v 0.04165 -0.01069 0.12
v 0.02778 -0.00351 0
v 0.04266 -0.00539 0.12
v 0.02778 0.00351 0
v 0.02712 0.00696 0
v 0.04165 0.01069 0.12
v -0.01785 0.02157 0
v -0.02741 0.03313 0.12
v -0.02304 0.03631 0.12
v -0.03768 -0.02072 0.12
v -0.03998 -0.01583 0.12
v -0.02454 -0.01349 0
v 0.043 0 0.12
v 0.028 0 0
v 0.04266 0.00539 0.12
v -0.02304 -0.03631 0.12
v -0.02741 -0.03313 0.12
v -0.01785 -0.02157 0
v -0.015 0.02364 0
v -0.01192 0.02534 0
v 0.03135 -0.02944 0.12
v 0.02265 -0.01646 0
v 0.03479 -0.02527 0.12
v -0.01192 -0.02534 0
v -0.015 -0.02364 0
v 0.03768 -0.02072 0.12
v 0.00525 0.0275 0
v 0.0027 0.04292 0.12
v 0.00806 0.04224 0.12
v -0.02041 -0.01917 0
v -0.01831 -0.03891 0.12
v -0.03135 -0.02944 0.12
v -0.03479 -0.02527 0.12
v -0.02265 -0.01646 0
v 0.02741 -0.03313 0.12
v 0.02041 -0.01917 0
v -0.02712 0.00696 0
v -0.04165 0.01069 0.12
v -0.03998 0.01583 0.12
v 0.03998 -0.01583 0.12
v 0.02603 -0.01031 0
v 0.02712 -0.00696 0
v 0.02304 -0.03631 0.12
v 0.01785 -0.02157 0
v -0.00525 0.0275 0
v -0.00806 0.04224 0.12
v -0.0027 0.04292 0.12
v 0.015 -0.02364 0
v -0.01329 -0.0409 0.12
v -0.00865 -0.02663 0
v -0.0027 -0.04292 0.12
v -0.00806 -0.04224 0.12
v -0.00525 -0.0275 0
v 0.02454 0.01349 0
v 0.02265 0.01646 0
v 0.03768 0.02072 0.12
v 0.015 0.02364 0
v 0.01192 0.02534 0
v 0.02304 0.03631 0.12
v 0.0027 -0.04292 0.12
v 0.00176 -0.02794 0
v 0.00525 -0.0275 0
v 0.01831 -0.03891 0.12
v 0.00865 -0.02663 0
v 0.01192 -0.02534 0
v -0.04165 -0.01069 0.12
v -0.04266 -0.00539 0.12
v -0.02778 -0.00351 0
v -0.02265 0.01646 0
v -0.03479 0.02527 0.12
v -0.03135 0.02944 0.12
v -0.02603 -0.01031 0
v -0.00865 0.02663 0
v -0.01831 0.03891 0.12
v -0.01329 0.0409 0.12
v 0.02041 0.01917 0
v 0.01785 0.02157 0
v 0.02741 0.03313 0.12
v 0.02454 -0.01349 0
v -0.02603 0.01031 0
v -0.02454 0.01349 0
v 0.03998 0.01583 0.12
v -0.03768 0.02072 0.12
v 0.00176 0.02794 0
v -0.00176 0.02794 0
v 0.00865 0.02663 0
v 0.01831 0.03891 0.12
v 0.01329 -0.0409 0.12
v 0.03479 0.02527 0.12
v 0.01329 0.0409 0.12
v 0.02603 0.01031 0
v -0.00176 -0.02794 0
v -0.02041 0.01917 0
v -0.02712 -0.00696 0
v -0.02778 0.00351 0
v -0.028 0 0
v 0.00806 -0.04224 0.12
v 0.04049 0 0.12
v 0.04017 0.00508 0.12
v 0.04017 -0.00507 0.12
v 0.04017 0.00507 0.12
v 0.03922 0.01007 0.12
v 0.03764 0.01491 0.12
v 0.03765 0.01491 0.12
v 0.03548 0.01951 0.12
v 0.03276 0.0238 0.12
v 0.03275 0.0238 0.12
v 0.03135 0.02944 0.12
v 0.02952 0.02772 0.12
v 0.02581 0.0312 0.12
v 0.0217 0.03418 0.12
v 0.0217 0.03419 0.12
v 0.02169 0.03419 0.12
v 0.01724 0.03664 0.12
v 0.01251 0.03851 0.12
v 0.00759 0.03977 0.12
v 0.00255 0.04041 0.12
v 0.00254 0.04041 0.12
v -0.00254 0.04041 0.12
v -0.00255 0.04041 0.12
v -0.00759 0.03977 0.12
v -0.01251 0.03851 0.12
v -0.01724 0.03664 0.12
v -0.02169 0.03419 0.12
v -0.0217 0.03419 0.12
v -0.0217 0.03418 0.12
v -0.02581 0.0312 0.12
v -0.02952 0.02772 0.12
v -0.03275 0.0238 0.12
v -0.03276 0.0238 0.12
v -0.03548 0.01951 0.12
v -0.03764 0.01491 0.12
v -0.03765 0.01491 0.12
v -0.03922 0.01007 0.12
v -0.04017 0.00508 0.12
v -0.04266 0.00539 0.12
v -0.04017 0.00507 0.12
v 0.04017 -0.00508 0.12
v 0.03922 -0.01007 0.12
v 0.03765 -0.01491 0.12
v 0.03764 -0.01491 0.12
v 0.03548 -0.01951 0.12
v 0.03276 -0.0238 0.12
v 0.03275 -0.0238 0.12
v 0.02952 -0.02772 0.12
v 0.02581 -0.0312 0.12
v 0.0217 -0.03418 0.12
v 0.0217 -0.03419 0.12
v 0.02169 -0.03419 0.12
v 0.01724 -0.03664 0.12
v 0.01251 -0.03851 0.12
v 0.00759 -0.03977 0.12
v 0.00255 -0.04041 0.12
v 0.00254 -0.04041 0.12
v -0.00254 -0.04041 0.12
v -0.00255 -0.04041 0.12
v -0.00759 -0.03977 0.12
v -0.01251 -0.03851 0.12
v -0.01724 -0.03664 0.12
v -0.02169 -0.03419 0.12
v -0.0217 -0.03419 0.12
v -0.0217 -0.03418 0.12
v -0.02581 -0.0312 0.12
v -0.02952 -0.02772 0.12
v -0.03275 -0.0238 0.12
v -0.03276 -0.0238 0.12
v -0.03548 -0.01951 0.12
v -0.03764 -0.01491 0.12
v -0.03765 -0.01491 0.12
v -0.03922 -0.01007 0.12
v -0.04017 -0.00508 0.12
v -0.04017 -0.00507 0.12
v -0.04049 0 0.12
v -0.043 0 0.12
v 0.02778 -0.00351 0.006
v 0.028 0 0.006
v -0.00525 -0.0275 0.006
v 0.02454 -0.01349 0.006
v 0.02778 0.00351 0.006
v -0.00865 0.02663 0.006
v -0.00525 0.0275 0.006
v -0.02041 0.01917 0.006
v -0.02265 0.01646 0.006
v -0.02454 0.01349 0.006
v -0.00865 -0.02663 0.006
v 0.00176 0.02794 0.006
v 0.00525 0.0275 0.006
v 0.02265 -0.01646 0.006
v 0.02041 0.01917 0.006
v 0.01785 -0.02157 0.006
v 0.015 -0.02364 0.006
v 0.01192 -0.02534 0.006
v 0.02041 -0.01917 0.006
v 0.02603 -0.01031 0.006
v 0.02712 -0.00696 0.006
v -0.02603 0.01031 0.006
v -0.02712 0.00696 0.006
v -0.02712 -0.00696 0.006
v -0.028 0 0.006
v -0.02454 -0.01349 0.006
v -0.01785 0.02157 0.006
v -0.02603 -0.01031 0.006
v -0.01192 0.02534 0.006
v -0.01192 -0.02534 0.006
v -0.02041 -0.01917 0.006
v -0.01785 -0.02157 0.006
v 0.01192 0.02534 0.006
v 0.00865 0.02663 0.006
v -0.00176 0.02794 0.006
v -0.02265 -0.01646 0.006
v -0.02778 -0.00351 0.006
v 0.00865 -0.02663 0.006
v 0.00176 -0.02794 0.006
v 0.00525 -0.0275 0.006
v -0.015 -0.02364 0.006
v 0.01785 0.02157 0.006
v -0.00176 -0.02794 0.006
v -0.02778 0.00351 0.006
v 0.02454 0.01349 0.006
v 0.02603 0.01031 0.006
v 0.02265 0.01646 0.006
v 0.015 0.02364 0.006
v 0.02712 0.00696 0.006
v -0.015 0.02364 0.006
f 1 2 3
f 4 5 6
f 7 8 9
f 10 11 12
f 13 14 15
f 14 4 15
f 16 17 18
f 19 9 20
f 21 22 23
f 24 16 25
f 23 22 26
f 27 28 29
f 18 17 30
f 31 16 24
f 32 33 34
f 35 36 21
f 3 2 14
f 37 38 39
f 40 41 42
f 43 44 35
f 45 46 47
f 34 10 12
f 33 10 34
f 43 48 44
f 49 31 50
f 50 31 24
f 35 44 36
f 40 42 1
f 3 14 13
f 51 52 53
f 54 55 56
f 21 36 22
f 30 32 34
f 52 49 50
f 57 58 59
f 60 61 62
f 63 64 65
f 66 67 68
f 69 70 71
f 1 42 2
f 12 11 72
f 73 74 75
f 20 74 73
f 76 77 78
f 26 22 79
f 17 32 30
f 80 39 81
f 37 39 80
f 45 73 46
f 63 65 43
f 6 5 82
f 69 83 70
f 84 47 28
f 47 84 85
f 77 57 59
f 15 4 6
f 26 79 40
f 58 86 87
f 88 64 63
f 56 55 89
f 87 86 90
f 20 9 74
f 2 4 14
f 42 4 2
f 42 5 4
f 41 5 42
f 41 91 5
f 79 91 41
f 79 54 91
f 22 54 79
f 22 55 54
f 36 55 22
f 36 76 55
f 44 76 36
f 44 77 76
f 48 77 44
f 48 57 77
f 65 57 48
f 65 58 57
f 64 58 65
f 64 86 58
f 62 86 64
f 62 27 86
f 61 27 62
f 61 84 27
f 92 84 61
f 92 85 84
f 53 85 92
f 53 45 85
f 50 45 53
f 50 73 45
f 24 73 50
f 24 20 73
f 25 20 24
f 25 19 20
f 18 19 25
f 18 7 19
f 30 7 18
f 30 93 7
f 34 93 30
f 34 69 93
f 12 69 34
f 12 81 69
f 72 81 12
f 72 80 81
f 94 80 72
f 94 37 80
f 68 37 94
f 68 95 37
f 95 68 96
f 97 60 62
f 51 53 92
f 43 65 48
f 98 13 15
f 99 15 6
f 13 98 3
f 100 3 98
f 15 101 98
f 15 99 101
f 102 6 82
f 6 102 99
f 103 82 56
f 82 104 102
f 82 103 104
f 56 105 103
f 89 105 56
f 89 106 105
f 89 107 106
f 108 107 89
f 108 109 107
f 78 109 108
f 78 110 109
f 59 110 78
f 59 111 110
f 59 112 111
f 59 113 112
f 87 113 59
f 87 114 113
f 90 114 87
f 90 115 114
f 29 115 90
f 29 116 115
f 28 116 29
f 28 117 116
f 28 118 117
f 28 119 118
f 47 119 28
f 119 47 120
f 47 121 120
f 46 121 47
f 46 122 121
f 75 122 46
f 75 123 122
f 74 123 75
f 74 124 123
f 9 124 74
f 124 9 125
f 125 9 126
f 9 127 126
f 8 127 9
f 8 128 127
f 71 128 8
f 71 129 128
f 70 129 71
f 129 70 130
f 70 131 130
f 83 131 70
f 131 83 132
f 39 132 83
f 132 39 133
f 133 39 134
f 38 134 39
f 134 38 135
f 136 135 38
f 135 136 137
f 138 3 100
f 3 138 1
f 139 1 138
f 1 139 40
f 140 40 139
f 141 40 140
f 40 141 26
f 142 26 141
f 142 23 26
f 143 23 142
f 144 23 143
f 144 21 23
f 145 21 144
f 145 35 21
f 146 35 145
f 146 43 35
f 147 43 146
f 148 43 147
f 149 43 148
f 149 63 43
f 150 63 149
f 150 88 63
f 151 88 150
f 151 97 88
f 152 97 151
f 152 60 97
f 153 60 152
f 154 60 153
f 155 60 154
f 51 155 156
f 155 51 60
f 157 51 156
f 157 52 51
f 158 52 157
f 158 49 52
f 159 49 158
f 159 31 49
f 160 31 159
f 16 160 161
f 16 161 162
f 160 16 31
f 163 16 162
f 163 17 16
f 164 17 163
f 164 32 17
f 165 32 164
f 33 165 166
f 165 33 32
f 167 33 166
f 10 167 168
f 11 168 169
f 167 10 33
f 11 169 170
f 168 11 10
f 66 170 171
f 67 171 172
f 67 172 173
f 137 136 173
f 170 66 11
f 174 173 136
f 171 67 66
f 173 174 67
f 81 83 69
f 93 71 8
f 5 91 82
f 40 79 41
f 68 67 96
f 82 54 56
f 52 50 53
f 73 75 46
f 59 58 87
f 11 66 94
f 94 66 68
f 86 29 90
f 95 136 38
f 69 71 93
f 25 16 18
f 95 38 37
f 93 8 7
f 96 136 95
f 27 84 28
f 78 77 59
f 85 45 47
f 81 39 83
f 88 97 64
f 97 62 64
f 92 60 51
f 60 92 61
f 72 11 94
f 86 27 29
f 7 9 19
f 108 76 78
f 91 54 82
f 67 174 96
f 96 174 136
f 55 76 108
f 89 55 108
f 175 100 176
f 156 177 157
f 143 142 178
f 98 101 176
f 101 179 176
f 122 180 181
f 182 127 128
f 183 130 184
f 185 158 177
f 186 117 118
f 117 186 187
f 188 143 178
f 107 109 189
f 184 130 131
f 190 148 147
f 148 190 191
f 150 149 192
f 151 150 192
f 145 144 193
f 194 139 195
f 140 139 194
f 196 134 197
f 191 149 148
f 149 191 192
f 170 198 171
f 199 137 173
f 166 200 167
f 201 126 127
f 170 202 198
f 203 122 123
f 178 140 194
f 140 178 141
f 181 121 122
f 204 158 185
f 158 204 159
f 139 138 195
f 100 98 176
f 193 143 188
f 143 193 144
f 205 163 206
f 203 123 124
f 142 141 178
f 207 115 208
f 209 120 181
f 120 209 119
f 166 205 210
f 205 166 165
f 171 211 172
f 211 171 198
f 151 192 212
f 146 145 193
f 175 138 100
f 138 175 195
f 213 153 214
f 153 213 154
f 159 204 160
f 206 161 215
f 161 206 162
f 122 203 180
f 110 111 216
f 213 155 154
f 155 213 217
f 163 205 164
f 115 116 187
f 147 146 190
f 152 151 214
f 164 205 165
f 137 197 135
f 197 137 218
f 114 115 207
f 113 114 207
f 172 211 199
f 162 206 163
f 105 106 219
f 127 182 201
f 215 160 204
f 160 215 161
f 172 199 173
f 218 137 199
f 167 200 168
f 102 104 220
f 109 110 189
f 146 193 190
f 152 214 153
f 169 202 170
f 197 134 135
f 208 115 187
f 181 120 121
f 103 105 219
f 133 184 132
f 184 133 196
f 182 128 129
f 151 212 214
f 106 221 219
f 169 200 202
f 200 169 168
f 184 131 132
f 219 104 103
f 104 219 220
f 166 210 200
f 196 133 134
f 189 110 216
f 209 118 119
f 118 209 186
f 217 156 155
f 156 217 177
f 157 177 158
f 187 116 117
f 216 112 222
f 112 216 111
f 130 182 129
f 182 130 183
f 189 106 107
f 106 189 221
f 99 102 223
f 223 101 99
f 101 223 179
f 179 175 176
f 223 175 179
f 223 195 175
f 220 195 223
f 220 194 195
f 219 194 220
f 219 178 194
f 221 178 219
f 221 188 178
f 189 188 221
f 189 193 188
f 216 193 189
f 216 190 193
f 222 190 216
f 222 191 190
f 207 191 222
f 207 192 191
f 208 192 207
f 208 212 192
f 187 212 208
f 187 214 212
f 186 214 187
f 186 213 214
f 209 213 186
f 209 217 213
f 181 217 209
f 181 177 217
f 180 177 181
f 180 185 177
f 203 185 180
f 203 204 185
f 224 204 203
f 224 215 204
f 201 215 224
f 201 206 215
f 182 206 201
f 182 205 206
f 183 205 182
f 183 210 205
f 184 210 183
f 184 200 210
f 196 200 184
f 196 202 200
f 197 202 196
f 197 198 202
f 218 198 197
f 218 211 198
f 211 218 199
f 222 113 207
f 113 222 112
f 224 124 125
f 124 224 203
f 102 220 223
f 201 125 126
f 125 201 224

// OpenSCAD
/** IKEA glass, dimensions in millimeters */

eps = 0.1;


// ROS wants meters
scale( [0.001, 0.001, 0.001] )  ikea_glass();


module ikea_glass() {
  difference() {
    cylinder( d1=56, d2=86, h=120, $fn=50, center=false ); 
    translate( [0,0,6] ) // bottom thickness
      cylinder( d1=56, d2=81, h=(120-6+eps), $fn=50, center=false );
  }
}
